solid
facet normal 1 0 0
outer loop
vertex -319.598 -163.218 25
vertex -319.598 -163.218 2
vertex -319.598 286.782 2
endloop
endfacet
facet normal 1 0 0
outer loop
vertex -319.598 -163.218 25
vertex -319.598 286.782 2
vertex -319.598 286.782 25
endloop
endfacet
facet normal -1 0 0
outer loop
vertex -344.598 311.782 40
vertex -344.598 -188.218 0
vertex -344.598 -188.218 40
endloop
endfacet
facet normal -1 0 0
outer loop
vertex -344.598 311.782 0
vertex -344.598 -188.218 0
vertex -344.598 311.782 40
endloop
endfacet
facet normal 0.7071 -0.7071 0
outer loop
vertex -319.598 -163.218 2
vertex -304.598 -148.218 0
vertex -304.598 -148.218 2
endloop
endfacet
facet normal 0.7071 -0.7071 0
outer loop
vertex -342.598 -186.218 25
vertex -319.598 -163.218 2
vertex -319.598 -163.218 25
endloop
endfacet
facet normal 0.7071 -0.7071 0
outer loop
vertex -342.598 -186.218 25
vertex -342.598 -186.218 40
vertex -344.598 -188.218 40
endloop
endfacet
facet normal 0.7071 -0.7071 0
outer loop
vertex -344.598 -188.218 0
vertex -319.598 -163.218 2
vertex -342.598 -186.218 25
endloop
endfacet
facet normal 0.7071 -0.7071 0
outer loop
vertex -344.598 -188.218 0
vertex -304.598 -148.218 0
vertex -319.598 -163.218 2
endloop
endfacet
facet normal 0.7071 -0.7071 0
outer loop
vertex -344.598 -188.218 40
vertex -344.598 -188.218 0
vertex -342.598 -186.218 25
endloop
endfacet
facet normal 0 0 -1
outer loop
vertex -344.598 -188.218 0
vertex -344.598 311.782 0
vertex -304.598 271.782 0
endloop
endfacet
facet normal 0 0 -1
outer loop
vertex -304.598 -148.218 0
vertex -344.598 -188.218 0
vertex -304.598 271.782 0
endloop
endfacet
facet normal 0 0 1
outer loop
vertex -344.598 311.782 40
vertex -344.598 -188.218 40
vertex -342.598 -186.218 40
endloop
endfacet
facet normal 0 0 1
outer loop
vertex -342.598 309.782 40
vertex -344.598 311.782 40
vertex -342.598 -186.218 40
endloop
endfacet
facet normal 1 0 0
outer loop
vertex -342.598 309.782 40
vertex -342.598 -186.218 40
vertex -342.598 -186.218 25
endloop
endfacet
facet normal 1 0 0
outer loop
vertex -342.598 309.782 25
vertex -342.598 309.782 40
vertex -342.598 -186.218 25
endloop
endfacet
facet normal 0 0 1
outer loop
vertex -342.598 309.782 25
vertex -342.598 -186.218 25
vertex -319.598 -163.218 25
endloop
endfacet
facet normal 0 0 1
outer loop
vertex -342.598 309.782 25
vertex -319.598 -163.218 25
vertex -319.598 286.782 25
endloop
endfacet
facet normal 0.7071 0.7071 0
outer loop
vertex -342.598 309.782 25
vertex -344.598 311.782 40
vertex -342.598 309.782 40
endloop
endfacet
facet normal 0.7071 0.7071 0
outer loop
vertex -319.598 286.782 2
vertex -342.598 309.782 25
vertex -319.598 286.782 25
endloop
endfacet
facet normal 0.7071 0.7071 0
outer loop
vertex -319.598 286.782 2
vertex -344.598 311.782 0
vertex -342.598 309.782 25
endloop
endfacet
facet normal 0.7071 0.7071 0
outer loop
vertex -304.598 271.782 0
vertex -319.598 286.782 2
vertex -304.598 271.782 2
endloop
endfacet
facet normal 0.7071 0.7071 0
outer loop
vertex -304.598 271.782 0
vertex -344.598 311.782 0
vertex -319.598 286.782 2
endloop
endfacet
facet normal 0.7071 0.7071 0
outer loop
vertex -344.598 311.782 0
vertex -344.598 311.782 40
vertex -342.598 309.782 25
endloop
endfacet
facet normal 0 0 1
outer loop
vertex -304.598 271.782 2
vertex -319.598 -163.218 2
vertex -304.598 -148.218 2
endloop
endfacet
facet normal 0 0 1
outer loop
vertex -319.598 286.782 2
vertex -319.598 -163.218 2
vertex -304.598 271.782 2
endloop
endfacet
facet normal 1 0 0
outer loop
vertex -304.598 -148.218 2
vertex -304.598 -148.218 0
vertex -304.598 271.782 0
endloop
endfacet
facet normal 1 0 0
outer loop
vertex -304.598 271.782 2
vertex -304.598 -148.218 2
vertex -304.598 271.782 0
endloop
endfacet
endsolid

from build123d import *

# Parameters (mm, degrees)
SKETCH2_W           = 40
SKETCH2_H           = 500
BOSS_EXTRUDE1_DEPTH = 40
SKETCH3_W           = 15
SKETCH3_H           = 23
SKETCH3_H_2         = 15
SKETCH3_W_2         = 23
CUT_EXTRUDE1_DEPTH  = 1000
CUT_EXTRUDE2_DEPTH  = 1000


with BuildPart() as part:
    # Sketch2 → Boss-Extrude1 (new body)
    with BuildSketch(Plane.XY):
        with Locations((-324.597701149, 61.781609195)):
            Rectangle(SKETCH2_W, SKETCH2_H)
    extrude(amount=BOSS_EXTRUDE1_DEPTH)

    # Sketch3 → Cut-Extrude1 (cut)
    with BuildSketch(Plane(origin=(0, 311.781609195, 0), x_dir=(1, 0, 0), z_dir=(0, 1, 0))):
        with Locations((-312.097701149, -13.5)):
            Rectangle(SKETCH3_W, SKETCH3_H)
        with Locations((-312.097701149, -32.5)):
            Rectangle(SKETCH3_W, SKETCH3_H_2)
        with Locations((-331.097701149, -32.5)):
            Rectangle(SKETCH3_W_2, SKETCH3_H_2)
    extrude(amount=-CUT_EXTRUDE1_DEPTH, mode=Mode.SUBTRACT)

    # Sketch4 → Cut-Extrude2 (cut)
    with BuildSketch(Plane(origin=(0, 0, 0), x_dir=(-1, 0, 0), z_dir=(0, 0, -1))):
        Polygon((304.597701149, 311.781609195), (344.597701149, 311.781609195), (304.597701149, 271.781609195), align=None)
        Polygon((344.597701149, -188.218390805), (304.597701149, -188.218390805), (304.597701149, -148.218390805), align=None)
    extrude(amount=-CUT_EXTRUDE2_DEPTH, mode=Mode.SUBTRACT)


solid = part.part
